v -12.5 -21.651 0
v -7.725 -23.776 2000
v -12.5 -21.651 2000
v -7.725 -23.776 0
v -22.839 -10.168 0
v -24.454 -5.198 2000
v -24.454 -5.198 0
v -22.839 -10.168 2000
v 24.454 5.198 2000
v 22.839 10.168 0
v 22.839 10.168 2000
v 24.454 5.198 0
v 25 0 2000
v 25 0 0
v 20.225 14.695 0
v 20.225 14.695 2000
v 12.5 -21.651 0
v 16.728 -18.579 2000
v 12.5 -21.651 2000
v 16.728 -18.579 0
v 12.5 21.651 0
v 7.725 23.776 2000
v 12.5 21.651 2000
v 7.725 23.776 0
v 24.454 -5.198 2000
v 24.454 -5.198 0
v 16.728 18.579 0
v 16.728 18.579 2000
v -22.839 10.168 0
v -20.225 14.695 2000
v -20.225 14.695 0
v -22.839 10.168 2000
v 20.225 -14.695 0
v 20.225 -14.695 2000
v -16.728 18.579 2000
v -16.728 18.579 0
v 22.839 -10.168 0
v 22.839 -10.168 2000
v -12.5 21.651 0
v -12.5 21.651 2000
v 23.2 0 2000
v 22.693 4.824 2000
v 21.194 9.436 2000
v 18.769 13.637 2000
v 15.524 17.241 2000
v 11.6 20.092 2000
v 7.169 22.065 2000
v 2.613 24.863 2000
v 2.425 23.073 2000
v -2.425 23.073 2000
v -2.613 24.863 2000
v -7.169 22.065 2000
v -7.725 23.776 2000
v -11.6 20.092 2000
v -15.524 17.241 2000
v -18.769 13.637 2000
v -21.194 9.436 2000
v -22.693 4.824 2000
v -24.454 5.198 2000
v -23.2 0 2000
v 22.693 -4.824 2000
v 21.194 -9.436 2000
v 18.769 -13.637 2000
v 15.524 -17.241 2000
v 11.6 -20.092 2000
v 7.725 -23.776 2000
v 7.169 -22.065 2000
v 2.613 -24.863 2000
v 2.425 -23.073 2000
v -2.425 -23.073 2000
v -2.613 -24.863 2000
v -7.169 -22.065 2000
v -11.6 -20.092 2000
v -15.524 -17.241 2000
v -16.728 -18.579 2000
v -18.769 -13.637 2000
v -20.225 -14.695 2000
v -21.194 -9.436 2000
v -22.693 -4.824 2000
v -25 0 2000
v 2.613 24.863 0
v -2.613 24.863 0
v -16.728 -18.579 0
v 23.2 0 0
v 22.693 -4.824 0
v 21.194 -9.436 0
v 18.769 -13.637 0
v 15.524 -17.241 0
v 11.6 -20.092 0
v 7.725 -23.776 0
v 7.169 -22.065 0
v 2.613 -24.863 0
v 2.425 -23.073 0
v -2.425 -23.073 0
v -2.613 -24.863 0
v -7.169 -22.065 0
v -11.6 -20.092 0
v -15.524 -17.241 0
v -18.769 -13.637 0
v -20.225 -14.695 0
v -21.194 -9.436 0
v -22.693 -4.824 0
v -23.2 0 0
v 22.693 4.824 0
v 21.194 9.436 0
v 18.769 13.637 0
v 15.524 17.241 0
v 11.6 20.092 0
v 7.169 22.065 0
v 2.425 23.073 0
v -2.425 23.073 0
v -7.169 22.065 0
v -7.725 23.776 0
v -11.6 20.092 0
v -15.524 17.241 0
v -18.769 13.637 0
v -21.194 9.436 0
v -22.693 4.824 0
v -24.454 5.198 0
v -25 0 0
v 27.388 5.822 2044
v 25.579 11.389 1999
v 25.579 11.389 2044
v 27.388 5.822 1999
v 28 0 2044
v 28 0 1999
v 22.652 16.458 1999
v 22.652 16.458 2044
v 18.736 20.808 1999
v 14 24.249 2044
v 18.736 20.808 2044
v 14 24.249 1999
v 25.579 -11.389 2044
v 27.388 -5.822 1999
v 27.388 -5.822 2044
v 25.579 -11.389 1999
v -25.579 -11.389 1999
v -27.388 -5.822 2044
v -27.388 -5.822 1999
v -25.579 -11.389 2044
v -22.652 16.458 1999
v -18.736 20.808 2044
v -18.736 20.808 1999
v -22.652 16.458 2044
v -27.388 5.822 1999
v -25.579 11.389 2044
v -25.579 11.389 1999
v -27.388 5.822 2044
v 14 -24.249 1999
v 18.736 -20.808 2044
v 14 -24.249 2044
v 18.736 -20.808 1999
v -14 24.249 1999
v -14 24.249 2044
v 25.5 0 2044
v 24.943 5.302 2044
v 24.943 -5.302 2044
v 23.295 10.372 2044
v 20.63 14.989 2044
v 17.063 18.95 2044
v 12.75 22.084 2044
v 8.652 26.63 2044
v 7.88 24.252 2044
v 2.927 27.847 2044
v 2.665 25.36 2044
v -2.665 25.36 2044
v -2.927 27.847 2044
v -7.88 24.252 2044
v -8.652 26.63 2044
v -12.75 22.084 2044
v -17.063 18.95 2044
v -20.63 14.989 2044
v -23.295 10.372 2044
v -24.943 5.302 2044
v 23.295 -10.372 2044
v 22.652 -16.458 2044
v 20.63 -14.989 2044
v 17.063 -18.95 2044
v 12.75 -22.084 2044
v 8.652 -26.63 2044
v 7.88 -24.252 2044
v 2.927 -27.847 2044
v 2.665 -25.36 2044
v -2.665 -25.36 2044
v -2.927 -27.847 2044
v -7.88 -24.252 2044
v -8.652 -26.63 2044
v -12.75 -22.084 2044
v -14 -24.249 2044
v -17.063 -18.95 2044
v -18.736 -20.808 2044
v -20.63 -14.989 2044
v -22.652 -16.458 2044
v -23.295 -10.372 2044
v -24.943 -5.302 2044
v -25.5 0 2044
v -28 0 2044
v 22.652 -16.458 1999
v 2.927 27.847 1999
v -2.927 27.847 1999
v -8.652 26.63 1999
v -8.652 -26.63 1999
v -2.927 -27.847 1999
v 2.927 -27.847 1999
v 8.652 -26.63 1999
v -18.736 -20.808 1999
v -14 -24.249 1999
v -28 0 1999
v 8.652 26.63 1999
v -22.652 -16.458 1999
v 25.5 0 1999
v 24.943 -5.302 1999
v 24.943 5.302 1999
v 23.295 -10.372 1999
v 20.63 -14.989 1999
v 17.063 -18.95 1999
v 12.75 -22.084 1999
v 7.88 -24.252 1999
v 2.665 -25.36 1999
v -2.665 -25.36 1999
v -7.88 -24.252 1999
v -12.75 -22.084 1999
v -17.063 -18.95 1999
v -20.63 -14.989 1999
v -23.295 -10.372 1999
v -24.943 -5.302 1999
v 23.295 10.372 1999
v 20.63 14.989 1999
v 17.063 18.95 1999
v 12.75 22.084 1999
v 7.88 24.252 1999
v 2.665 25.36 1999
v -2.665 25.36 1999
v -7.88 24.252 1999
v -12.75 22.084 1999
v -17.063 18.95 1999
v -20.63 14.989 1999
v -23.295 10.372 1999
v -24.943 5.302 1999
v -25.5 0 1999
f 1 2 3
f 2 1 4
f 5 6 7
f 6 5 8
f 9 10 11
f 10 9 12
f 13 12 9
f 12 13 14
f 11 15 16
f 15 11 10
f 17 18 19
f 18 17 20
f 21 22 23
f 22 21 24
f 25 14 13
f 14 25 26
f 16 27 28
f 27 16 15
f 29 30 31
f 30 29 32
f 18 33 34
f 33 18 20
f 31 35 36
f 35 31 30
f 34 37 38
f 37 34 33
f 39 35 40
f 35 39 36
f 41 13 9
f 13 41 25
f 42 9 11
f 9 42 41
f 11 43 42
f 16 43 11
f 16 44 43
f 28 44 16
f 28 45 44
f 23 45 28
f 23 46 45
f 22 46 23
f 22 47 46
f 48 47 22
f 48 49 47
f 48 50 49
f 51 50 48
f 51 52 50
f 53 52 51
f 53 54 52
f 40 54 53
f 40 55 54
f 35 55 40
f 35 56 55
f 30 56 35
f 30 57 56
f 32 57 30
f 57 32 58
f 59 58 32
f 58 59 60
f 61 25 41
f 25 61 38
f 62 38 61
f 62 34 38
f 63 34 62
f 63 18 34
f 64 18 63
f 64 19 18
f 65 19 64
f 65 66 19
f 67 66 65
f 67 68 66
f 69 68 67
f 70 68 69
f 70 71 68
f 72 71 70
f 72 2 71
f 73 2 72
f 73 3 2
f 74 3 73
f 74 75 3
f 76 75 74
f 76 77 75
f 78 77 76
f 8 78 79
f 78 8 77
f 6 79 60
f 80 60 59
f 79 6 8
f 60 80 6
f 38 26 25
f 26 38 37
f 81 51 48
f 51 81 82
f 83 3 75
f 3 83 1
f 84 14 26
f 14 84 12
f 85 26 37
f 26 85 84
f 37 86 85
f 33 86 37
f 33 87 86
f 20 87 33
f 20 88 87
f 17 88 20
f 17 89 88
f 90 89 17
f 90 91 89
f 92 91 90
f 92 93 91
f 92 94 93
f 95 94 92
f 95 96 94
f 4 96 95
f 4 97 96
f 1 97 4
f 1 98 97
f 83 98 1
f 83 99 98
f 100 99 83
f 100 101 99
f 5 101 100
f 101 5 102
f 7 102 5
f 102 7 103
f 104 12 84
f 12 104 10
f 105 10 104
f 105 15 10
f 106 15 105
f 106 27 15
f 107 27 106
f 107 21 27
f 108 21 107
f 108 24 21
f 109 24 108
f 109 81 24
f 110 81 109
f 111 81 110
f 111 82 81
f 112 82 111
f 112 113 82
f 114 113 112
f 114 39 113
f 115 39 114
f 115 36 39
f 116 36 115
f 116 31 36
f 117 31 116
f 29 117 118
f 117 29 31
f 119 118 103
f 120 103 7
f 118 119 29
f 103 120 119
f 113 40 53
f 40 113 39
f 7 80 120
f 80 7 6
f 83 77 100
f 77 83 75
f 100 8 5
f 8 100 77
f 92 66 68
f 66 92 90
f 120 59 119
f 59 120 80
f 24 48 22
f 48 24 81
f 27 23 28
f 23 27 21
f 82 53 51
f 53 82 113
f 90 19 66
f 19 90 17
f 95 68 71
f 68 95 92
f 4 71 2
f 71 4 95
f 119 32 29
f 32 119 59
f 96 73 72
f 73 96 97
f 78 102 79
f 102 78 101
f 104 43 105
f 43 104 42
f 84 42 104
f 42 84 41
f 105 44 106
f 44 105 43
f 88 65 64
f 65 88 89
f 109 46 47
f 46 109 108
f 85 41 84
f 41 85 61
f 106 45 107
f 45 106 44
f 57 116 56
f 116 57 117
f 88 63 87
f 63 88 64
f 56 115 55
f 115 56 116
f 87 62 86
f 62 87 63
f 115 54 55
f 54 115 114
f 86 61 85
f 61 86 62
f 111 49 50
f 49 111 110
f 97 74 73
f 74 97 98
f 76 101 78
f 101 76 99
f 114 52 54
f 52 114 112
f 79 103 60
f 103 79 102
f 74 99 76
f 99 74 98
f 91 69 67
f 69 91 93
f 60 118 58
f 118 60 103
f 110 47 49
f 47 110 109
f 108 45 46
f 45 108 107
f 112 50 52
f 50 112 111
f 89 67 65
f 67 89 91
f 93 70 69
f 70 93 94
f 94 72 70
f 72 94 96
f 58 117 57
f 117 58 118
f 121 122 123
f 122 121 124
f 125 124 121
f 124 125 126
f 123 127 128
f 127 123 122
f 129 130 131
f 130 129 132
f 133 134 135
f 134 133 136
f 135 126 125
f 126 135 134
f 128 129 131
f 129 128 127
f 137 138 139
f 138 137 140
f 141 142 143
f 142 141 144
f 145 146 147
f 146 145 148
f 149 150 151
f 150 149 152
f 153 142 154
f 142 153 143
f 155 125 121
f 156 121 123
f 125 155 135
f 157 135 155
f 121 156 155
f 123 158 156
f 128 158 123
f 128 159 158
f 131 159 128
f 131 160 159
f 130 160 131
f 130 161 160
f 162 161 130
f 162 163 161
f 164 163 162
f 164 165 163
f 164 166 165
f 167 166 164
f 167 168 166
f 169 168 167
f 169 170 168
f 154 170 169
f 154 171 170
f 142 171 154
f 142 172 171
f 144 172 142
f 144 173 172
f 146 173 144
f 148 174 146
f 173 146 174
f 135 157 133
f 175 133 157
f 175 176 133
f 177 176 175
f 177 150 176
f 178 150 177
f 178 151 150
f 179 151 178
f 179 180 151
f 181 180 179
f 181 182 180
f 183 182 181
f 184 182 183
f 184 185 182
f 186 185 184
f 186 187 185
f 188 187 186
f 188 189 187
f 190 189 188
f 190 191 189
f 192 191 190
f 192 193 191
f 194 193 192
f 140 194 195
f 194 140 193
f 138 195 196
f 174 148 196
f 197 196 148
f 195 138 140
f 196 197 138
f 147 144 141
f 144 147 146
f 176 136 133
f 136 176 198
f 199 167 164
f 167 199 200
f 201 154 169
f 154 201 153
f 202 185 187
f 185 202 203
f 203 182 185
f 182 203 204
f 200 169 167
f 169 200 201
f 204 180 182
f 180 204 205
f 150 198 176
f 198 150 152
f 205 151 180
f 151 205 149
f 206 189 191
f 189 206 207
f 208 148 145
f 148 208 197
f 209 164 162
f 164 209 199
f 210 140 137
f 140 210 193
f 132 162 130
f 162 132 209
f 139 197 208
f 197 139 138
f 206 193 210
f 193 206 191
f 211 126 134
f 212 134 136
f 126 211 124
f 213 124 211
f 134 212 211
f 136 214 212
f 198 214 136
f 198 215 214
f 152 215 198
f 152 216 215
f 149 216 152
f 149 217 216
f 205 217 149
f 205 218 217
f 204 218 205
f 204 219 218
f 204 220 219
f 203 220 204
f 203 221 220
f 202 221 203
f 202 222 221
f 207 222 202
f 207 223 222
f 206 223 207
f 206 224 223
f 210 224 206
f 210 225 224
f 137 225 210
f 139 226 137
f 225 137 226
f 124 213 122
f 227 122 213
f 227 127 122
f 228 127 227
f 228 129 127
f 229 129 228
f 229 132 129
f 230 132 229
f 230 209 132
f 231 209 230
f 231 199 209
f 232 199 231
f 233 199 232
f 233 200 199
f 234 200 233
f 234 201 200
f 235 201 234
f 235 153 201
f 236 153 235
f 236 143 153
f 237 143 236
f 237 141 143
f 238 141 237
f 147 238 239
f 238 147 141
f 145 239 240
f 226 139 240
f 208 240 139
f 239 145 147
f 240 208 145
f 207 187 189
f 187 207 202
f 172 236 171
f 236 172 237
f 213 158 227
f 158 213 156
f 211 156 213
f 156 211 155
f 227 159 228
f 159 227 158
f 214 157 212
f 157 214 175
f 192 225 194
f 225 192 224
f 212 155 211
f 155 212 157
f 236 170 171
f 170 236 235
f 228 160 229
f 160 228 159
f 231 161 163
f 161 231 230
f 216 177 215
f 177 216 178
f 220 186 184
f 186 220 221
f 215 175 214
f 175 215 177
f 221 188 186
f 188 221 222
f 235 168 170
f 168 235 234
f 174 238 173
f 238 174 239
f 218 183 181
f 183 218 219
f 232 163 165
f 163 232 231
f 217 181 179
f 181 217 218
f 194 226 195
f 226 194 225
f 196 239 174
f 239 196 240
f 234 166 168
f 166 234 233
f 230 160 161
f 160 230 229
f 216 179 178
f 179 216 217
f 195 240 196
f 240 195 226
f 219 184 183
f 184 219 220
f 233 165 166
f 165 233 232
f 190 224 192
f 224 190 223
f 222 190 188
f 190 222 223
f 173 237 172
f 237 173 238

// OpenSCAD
// Parameters
pipe_standard = 1; //[1:1:1]
nominal_size = 50; //[25:100:1]
length_mm = 2000; //[1000:4000:10]
include_end_fitting = 1; //[0:1:1]
ht50_od = 50; //[40:70:0.5]
ht50_wall = 1.8; //[1:4:0.1]
fit_socket_od_extra = 6; //[3:12:0.5]
fit_socket_length = 45; //[25:80:1]
fit_socket_wall = 2.5; //[1.5:6:0.1]
fit_stop_thickness = 3; //[1:8:0.5]
fit_stop_length = 6; //[2:15:0.5]
overlap = 1; //[0.5:2:0.1]

// Module for the HT Pipe
module ht_pipe() {
  color([0.85, 0.85, 0.8]) { // PVC color
    // Pipe body
    difference() {
      cylinder(r=ht50_od/2, h=length_mm, center=false);
      translate([0, 0, -overlap])
        cylinder(r=ht50_od/2 - ht50_wall, h=length_mm + overlap*2, center=false);
    }
    
    // End fitting
    if (include_end_fitting) {
      translate([0, 0, length_mm - overlap]) {
        difference() {
          cylinder(r=ht50_od/2 + fit_socket_od_extra/2, h=fit_socket_length, center=false);
          translate([0, 0, -overlap])
            cylinder(r=ht50_od/2 + fit_socket_od_extra/2 - fit_socket_wall, h=fit_socket_length + overlap*2, center=false);
          translate([0, 0, (fit_socket_length - fit_stop_length) - overlap])
            cylinder(r=ht50_od/2 + fit_socket_od_extra/2 - fit_socket_wall - fit_stop_thickness, h=fit_stop_length + overlap*2, center=false);
        }
      }
    }
  }
}

// Assembly
module assembly() {
  ht_pipe();
}

assembly();
